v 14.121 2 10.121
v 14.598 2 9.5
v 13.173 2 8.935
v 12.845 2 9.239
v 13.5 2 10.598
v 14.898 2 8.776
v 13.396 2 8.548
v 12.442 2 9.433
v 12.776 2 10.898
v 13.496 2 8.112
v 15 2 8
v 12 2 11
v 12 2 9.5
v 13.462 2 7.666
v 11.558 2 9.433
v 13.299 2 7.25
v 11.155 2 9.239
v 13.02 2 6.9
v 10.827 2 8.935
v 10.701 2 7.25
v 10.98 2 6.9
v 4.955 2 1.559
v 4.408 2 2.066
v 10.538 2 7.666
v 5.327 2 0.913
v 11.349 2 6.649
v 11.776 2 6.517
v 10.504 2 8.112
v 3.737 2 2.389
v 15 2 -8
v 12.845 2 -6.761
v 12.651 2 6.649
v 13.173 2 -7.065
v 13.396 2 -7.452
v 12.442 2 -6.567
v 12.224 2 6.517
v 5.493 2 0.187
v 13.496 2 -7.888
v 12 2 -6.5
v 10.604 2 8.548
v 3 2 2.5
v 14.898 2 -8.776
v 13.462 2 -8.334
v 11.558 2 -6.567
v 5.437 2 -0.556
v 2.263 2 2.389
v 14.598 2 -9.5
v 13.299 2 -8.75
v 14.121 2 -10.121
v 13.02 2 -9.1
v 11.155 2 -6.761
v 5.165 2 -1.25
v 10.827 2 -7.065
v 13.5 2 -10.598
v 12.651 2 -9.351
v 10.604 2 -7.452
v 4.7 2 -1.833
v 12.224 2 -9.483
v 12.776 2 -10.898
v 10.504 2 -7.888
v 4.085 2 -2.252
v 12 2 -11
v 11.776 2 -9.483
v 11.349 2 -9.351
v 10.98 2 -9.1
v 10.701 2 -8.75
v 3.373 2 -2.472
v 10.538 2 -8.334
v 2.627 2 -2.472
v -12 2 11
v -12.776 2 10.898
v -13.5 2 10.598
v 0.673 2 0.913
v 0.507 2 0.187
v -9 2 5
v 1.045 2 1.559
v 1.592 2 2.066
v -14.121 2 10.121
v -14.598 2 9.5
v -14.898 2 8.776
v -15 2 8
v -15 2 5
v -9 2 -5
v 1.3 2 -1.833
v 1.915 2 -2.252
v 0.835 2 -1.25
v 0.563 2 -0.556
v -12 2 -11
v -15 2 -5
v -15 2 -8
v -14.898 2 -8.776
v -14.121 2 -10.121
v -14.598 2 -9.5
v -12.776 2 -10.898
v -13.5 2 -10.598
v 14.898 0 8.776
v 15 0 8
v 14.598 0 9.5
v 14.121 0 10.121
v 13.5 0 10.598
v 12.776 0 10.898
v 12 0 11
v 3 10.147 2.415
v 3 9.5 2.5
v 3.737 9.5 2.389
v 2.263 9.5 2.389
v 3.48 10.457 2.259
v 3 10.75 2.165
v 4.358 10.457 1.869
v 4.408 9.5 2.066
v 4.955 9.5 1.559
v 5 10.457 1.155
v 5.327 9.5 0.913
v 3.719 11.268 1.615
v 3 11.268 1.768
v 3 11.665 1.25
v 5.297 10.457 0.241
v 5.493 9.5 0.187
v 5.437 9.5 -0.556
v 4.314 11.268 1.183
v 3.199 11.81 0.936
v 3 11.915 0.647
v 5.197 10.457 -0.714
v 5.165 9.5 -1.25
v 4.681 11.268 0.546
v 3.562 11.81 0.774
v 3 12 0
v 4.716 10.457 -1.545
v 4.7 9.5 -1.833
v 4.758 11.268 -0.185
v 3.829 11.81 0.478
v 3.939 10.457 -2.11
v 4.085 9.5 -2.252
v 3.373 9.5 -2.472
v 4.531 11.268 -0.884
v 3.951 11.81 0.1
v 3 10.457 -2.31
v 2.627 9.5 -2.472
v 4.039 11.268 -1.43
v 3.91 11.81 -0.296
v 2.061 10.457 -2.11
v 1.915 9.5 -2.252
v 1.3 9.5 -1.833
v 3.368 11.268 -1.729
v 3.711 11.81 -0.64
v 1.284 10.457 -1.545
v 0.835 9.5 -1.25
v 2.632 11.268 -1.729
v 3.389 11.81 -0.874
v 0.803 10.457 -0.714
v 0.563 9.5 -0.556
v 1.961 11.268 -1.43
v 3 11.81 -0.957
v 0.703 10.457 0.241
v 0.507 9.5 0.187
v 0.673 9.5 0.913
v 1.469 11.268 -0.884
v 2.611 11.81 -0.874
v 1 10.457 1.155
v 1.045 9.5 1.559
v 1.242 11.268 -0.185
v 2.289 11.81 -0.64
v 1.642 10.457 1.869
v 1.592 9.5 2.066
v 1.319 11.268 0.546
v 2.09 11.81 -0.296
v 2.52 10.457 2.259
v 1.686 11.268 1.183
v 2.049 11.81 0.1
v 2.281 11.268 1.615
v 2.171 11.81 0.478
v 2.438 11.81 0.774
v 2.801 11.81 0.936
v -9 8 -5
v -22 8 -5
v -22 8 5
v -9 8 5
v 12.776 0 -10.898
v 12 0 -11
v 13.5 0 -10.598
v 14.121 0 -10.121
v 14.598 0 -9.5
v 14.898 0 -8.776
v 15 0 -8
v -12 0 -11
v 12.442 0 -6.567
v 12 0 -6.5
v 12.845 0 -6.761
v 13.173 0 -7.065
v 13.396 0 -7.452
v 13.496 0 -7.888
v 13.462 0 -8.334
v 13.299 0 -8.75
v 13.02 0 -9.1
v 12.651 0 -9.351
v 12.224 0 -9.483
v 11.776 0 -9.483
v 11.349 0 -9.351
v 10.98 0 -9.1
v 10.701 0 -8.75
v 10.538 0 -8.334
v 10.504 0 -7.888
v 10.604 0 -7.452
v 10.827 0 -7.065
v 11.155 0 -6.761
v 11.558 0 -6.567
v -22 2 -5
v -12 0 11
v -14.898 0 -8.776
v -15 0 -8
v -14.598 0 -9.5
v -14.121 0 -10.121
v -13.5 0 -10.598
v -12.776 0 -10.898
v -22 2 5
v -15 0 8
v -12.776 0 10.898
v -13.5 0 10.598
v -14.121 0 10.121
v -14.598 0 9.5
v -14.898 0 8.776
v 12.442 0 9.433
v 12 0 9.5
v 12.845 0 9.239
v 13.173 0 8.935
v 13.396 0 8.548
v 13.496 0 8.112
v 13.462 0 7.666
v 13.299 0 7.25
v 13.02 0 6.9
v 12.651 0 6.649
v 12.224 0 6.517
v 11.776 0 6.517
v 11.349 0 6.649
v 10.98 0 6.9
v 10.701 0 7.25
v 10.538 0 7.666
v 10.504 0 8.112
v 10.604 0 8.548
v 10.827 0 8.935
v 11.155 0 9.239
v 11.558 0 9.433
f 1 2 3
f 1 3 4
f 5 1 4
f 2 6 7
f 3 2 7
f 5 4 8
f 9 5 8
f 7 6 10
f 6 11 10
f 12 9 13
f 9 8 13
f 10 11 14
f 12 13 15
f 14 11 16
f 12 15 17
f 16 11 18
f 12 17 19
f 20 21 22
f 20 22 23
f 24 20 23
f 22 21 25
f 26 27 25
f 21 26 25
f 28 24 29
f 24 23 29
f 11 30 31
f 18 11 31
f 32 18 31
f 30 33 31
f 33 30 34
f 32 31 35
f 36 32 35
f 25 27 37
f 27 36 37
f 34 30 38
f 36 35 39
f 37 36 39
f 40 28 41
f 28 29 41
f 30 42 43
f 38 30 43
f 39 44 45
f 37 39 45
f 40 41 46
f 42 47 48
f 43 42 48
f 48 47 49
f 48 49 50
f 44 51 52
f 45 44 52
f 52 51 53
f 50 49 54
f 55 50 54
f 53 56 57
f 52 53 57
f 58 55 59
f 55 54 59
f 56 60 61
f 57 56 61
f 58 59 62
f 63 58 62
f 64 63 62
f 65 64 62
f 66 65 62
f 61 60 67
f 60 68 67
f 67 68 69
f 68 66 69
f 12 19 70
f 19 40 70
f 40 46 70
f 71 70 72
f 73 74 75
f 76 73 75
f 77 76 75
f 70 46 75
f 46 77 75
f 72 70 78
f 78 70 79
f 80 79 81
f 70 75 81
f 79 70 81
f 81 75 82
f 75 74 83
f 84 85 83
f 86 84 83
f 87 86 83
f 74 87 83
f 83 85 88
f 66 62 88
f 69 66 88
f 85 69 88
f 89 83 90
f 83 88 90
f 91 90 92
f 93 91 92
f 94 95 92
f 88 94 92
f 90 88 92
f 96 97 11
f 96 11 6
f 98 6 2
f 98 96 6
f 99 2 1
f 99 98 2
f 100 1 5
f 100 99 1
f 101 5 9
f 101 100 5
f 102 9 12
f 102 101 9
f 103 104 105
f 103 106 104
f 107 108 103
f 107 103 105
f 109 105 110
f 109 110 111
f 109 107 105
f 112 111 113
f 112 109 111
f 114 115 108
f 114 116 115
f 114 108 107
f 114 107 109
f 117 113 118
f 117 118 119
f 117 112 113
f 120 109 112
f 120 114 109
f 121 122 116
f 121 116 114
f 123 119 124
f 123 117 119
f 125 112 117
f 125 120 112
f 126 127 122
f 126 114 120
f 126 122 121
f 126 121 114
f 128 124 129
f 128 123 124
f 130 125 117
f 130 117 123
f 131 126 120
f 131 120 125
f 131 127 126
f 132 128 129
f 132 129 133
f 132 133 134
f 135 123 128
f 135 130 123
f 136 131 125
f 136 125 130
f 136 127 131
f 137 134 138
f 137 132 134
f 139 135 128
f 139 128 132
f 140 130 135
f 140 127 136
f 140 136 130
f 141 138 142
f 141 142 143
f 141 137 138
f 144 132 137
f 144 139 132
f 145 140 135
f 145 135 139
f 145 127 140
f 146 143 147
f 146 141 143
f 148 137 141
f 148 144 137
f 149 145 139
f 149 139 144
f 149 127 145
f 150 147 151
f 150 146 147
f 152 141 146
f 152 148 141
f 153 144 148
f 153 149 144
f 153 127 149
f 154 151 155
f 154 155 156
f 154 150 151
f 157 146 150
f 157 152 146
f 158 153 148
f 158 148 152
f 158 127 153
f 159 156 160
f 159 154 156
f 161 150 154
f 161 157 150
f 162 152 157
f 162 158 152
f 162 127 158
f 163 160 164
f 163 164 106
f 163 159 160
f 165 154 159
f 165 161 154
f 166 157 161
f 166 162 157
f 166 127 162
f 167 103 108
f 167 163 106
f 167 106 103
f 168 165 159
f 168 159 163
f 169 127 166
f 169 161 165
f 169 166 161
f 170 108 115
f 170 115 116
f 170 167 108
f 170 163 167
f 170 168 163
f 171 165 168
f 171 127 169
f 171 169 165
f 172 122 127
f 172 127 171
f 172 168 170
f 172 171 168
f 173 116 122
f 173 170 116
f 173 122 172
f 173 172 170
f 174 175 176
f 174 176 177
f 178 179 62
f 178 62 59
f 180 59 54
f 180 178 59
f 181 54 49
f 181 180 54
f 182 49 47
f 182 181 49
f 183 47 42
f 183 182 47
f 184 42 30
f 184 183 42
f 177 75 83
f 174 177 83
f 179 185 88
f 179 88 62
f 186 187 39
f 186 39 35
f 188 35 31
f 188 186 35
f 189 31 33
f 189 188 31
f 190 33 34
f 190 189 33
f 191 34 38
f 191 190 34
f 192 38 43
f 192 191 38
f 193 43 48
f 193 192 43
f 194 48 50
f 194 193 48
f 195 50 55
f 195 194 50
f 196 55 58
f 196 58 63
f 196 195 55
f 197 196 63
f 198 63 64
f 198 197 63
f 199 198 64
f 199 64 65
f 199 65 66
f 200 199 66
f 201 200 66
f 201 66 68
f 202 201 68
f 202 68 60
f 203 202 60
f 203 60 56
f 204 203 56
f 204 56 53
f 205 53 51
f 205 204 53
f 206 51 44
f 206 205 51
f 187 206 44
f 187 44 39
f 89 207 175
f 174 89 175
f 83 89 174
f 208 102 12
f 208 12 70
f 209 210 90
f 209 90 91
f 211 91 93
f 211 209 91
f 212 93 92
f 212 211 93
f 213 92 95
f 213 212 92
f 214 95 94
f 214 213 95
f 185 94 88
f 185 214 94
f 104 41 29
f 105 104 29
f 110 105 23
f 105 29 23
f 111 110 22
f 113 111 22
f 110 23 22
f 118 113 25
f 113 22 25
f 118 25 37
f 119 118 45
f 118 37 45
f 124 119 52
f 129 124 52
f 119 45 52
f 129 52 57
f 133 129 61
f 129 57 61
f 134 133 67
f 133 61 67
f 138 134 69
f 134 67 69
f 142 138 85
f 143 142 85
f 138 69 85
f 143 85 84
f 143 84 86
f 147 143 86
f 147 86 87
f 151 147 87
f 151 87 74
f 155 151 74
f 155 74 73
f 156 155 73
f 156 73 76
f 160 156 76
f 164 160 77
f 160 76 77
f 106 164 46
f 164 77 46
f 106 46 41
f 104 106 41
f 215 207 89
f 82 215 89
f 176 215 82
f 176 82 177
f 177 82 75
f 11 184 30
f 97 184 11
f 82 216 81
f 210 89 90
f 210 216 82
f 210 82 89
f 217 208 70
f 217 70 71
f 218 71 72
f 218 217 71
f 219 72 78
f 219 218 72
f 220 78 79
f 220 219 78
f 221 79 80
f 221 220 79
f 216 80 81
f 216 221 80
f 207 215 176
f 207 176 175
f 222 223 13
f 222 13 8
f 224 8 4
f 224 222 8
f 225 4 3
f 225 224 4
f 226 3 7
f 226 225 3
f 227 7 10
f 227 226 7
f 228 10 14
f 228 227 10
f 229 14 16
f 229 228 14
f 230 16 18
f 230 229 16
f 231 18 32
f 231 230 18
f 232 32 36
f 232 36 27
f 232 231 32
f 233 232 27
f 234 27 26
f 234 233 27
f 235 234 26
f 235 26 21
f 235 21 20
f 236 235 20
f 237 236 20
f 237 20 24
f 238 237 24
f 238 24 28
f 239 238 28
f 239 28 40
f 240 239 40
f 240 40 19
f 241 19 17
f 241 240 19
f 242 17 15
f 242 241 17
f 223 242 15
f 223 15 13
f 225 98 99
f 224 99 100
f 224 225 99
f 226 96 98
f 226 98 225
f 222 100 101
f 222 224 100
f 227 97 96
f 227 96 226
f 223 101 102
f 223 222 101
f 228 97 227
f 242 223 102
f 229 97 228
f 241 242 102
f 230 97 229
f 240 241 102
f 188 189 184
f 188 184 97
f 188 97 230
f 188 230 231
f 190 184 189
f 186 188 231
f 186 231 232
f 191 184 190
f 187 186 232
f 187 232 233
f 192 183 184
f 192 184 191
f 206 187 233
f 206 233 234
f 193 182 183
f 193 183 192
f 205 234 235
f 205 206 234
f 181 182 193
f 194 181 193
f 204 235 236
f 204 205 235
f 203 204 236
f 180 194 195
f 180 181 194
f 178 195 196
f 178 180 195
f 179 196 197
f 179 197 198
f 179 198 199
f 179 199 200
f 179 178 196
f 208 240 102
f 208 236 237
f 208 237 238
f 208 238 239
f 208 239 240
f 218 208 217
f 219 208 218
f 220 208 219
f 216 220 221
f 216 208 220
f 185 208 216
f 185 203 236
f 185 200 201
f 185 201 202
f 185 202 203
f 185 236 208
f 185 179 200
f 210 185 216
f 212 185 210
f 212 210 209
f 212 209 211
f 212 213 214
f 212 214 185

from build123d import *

# Parameters (mm, degrees)
SKETCH1_R           = 1.5
BOSS_EXTRUDE1_DEPTH = 2
SKETCH2_W           = 13
SKETCH2_H           = 10
BOSS_EXTRUDE2_DEPTH = 6
SKETCH3_R           = 2.5
BOSS_EXTRUDE3_DEPTH = 10
FILLET1_R           = 2.5


with BuildPart() as part:
    # Sketch1 → Boss-Extrude1 (new body)
    with BuildSketch(Plane(origin=(0, 0, 0), x_dir=(1, 0, 0), z_dir=(0, 1, 0))):
        with BuildLine():
            Line((-12, 11), (12, 11))
            ThreePointArc((12, 11), (14.121320344, 10.121320344), (15, 8))
            Line((15, 8), (15, -8))
            ThreePointArc((15, -8), (14.121320344, -10.121320344), (12, -11))
            Line((12, -11), (-12, -11))
            ThreePointArc((-12, -11), (-14.121320344, -10.121320344), (-15, -8))
            Line((-15, -8), (-15, 8))
            ThreePointArc((-15, 8), (-14.121320344, 10.121320344), (-12, 11))
        make_face()
        with Locations(Location((12, 8, 0), (0, 0, 270))):
            Circle(SKETCH1_R, mode=Mode.SUBTRACT)
        with Locations(Location((12, -8, 0), (0, 0, 270))):
            Circle(SKETCH1_R, mode=Mode.SUBTRACT)
    extrude(amount=BOSS_EXTRUDE1_DEPTH)

    # Sketch2 → Boss-Extrude2 (add)
    with BuildSketch(Plane(origin=(0, 2, 0), x_dir=(1, 0, 0), z_dir=(0, 1, 0))):
        with Locations((-15.5, 0)):
            Rectangle(SKETCH2_W, SKETCH2_H)
    extrude(amount=BOSS_EXTRUDE2_DEPTH)

    # Sketch3 → Boss-Extrude3 (add)
    with BuildSketch(Plane(origin=(0, 2, 0), x_dir=(1, 0, 0), z_dir=(0, 1, 0))):
        with Locations(Location((3, 0, 0), (0, 0, 270))):
            Circle(SKETCH3_R)
    extrude(amount=BOSS_EXTRUDE3_DEPTH)

    # Fillet1
    fillet1_edges = [part.edges().sort_by_distance(p)[0] for p in [
        (3, 12, -2.5),
    ]]
    fillet(fillet1_edges, radius=FILLET1_R)


solid = part.part
